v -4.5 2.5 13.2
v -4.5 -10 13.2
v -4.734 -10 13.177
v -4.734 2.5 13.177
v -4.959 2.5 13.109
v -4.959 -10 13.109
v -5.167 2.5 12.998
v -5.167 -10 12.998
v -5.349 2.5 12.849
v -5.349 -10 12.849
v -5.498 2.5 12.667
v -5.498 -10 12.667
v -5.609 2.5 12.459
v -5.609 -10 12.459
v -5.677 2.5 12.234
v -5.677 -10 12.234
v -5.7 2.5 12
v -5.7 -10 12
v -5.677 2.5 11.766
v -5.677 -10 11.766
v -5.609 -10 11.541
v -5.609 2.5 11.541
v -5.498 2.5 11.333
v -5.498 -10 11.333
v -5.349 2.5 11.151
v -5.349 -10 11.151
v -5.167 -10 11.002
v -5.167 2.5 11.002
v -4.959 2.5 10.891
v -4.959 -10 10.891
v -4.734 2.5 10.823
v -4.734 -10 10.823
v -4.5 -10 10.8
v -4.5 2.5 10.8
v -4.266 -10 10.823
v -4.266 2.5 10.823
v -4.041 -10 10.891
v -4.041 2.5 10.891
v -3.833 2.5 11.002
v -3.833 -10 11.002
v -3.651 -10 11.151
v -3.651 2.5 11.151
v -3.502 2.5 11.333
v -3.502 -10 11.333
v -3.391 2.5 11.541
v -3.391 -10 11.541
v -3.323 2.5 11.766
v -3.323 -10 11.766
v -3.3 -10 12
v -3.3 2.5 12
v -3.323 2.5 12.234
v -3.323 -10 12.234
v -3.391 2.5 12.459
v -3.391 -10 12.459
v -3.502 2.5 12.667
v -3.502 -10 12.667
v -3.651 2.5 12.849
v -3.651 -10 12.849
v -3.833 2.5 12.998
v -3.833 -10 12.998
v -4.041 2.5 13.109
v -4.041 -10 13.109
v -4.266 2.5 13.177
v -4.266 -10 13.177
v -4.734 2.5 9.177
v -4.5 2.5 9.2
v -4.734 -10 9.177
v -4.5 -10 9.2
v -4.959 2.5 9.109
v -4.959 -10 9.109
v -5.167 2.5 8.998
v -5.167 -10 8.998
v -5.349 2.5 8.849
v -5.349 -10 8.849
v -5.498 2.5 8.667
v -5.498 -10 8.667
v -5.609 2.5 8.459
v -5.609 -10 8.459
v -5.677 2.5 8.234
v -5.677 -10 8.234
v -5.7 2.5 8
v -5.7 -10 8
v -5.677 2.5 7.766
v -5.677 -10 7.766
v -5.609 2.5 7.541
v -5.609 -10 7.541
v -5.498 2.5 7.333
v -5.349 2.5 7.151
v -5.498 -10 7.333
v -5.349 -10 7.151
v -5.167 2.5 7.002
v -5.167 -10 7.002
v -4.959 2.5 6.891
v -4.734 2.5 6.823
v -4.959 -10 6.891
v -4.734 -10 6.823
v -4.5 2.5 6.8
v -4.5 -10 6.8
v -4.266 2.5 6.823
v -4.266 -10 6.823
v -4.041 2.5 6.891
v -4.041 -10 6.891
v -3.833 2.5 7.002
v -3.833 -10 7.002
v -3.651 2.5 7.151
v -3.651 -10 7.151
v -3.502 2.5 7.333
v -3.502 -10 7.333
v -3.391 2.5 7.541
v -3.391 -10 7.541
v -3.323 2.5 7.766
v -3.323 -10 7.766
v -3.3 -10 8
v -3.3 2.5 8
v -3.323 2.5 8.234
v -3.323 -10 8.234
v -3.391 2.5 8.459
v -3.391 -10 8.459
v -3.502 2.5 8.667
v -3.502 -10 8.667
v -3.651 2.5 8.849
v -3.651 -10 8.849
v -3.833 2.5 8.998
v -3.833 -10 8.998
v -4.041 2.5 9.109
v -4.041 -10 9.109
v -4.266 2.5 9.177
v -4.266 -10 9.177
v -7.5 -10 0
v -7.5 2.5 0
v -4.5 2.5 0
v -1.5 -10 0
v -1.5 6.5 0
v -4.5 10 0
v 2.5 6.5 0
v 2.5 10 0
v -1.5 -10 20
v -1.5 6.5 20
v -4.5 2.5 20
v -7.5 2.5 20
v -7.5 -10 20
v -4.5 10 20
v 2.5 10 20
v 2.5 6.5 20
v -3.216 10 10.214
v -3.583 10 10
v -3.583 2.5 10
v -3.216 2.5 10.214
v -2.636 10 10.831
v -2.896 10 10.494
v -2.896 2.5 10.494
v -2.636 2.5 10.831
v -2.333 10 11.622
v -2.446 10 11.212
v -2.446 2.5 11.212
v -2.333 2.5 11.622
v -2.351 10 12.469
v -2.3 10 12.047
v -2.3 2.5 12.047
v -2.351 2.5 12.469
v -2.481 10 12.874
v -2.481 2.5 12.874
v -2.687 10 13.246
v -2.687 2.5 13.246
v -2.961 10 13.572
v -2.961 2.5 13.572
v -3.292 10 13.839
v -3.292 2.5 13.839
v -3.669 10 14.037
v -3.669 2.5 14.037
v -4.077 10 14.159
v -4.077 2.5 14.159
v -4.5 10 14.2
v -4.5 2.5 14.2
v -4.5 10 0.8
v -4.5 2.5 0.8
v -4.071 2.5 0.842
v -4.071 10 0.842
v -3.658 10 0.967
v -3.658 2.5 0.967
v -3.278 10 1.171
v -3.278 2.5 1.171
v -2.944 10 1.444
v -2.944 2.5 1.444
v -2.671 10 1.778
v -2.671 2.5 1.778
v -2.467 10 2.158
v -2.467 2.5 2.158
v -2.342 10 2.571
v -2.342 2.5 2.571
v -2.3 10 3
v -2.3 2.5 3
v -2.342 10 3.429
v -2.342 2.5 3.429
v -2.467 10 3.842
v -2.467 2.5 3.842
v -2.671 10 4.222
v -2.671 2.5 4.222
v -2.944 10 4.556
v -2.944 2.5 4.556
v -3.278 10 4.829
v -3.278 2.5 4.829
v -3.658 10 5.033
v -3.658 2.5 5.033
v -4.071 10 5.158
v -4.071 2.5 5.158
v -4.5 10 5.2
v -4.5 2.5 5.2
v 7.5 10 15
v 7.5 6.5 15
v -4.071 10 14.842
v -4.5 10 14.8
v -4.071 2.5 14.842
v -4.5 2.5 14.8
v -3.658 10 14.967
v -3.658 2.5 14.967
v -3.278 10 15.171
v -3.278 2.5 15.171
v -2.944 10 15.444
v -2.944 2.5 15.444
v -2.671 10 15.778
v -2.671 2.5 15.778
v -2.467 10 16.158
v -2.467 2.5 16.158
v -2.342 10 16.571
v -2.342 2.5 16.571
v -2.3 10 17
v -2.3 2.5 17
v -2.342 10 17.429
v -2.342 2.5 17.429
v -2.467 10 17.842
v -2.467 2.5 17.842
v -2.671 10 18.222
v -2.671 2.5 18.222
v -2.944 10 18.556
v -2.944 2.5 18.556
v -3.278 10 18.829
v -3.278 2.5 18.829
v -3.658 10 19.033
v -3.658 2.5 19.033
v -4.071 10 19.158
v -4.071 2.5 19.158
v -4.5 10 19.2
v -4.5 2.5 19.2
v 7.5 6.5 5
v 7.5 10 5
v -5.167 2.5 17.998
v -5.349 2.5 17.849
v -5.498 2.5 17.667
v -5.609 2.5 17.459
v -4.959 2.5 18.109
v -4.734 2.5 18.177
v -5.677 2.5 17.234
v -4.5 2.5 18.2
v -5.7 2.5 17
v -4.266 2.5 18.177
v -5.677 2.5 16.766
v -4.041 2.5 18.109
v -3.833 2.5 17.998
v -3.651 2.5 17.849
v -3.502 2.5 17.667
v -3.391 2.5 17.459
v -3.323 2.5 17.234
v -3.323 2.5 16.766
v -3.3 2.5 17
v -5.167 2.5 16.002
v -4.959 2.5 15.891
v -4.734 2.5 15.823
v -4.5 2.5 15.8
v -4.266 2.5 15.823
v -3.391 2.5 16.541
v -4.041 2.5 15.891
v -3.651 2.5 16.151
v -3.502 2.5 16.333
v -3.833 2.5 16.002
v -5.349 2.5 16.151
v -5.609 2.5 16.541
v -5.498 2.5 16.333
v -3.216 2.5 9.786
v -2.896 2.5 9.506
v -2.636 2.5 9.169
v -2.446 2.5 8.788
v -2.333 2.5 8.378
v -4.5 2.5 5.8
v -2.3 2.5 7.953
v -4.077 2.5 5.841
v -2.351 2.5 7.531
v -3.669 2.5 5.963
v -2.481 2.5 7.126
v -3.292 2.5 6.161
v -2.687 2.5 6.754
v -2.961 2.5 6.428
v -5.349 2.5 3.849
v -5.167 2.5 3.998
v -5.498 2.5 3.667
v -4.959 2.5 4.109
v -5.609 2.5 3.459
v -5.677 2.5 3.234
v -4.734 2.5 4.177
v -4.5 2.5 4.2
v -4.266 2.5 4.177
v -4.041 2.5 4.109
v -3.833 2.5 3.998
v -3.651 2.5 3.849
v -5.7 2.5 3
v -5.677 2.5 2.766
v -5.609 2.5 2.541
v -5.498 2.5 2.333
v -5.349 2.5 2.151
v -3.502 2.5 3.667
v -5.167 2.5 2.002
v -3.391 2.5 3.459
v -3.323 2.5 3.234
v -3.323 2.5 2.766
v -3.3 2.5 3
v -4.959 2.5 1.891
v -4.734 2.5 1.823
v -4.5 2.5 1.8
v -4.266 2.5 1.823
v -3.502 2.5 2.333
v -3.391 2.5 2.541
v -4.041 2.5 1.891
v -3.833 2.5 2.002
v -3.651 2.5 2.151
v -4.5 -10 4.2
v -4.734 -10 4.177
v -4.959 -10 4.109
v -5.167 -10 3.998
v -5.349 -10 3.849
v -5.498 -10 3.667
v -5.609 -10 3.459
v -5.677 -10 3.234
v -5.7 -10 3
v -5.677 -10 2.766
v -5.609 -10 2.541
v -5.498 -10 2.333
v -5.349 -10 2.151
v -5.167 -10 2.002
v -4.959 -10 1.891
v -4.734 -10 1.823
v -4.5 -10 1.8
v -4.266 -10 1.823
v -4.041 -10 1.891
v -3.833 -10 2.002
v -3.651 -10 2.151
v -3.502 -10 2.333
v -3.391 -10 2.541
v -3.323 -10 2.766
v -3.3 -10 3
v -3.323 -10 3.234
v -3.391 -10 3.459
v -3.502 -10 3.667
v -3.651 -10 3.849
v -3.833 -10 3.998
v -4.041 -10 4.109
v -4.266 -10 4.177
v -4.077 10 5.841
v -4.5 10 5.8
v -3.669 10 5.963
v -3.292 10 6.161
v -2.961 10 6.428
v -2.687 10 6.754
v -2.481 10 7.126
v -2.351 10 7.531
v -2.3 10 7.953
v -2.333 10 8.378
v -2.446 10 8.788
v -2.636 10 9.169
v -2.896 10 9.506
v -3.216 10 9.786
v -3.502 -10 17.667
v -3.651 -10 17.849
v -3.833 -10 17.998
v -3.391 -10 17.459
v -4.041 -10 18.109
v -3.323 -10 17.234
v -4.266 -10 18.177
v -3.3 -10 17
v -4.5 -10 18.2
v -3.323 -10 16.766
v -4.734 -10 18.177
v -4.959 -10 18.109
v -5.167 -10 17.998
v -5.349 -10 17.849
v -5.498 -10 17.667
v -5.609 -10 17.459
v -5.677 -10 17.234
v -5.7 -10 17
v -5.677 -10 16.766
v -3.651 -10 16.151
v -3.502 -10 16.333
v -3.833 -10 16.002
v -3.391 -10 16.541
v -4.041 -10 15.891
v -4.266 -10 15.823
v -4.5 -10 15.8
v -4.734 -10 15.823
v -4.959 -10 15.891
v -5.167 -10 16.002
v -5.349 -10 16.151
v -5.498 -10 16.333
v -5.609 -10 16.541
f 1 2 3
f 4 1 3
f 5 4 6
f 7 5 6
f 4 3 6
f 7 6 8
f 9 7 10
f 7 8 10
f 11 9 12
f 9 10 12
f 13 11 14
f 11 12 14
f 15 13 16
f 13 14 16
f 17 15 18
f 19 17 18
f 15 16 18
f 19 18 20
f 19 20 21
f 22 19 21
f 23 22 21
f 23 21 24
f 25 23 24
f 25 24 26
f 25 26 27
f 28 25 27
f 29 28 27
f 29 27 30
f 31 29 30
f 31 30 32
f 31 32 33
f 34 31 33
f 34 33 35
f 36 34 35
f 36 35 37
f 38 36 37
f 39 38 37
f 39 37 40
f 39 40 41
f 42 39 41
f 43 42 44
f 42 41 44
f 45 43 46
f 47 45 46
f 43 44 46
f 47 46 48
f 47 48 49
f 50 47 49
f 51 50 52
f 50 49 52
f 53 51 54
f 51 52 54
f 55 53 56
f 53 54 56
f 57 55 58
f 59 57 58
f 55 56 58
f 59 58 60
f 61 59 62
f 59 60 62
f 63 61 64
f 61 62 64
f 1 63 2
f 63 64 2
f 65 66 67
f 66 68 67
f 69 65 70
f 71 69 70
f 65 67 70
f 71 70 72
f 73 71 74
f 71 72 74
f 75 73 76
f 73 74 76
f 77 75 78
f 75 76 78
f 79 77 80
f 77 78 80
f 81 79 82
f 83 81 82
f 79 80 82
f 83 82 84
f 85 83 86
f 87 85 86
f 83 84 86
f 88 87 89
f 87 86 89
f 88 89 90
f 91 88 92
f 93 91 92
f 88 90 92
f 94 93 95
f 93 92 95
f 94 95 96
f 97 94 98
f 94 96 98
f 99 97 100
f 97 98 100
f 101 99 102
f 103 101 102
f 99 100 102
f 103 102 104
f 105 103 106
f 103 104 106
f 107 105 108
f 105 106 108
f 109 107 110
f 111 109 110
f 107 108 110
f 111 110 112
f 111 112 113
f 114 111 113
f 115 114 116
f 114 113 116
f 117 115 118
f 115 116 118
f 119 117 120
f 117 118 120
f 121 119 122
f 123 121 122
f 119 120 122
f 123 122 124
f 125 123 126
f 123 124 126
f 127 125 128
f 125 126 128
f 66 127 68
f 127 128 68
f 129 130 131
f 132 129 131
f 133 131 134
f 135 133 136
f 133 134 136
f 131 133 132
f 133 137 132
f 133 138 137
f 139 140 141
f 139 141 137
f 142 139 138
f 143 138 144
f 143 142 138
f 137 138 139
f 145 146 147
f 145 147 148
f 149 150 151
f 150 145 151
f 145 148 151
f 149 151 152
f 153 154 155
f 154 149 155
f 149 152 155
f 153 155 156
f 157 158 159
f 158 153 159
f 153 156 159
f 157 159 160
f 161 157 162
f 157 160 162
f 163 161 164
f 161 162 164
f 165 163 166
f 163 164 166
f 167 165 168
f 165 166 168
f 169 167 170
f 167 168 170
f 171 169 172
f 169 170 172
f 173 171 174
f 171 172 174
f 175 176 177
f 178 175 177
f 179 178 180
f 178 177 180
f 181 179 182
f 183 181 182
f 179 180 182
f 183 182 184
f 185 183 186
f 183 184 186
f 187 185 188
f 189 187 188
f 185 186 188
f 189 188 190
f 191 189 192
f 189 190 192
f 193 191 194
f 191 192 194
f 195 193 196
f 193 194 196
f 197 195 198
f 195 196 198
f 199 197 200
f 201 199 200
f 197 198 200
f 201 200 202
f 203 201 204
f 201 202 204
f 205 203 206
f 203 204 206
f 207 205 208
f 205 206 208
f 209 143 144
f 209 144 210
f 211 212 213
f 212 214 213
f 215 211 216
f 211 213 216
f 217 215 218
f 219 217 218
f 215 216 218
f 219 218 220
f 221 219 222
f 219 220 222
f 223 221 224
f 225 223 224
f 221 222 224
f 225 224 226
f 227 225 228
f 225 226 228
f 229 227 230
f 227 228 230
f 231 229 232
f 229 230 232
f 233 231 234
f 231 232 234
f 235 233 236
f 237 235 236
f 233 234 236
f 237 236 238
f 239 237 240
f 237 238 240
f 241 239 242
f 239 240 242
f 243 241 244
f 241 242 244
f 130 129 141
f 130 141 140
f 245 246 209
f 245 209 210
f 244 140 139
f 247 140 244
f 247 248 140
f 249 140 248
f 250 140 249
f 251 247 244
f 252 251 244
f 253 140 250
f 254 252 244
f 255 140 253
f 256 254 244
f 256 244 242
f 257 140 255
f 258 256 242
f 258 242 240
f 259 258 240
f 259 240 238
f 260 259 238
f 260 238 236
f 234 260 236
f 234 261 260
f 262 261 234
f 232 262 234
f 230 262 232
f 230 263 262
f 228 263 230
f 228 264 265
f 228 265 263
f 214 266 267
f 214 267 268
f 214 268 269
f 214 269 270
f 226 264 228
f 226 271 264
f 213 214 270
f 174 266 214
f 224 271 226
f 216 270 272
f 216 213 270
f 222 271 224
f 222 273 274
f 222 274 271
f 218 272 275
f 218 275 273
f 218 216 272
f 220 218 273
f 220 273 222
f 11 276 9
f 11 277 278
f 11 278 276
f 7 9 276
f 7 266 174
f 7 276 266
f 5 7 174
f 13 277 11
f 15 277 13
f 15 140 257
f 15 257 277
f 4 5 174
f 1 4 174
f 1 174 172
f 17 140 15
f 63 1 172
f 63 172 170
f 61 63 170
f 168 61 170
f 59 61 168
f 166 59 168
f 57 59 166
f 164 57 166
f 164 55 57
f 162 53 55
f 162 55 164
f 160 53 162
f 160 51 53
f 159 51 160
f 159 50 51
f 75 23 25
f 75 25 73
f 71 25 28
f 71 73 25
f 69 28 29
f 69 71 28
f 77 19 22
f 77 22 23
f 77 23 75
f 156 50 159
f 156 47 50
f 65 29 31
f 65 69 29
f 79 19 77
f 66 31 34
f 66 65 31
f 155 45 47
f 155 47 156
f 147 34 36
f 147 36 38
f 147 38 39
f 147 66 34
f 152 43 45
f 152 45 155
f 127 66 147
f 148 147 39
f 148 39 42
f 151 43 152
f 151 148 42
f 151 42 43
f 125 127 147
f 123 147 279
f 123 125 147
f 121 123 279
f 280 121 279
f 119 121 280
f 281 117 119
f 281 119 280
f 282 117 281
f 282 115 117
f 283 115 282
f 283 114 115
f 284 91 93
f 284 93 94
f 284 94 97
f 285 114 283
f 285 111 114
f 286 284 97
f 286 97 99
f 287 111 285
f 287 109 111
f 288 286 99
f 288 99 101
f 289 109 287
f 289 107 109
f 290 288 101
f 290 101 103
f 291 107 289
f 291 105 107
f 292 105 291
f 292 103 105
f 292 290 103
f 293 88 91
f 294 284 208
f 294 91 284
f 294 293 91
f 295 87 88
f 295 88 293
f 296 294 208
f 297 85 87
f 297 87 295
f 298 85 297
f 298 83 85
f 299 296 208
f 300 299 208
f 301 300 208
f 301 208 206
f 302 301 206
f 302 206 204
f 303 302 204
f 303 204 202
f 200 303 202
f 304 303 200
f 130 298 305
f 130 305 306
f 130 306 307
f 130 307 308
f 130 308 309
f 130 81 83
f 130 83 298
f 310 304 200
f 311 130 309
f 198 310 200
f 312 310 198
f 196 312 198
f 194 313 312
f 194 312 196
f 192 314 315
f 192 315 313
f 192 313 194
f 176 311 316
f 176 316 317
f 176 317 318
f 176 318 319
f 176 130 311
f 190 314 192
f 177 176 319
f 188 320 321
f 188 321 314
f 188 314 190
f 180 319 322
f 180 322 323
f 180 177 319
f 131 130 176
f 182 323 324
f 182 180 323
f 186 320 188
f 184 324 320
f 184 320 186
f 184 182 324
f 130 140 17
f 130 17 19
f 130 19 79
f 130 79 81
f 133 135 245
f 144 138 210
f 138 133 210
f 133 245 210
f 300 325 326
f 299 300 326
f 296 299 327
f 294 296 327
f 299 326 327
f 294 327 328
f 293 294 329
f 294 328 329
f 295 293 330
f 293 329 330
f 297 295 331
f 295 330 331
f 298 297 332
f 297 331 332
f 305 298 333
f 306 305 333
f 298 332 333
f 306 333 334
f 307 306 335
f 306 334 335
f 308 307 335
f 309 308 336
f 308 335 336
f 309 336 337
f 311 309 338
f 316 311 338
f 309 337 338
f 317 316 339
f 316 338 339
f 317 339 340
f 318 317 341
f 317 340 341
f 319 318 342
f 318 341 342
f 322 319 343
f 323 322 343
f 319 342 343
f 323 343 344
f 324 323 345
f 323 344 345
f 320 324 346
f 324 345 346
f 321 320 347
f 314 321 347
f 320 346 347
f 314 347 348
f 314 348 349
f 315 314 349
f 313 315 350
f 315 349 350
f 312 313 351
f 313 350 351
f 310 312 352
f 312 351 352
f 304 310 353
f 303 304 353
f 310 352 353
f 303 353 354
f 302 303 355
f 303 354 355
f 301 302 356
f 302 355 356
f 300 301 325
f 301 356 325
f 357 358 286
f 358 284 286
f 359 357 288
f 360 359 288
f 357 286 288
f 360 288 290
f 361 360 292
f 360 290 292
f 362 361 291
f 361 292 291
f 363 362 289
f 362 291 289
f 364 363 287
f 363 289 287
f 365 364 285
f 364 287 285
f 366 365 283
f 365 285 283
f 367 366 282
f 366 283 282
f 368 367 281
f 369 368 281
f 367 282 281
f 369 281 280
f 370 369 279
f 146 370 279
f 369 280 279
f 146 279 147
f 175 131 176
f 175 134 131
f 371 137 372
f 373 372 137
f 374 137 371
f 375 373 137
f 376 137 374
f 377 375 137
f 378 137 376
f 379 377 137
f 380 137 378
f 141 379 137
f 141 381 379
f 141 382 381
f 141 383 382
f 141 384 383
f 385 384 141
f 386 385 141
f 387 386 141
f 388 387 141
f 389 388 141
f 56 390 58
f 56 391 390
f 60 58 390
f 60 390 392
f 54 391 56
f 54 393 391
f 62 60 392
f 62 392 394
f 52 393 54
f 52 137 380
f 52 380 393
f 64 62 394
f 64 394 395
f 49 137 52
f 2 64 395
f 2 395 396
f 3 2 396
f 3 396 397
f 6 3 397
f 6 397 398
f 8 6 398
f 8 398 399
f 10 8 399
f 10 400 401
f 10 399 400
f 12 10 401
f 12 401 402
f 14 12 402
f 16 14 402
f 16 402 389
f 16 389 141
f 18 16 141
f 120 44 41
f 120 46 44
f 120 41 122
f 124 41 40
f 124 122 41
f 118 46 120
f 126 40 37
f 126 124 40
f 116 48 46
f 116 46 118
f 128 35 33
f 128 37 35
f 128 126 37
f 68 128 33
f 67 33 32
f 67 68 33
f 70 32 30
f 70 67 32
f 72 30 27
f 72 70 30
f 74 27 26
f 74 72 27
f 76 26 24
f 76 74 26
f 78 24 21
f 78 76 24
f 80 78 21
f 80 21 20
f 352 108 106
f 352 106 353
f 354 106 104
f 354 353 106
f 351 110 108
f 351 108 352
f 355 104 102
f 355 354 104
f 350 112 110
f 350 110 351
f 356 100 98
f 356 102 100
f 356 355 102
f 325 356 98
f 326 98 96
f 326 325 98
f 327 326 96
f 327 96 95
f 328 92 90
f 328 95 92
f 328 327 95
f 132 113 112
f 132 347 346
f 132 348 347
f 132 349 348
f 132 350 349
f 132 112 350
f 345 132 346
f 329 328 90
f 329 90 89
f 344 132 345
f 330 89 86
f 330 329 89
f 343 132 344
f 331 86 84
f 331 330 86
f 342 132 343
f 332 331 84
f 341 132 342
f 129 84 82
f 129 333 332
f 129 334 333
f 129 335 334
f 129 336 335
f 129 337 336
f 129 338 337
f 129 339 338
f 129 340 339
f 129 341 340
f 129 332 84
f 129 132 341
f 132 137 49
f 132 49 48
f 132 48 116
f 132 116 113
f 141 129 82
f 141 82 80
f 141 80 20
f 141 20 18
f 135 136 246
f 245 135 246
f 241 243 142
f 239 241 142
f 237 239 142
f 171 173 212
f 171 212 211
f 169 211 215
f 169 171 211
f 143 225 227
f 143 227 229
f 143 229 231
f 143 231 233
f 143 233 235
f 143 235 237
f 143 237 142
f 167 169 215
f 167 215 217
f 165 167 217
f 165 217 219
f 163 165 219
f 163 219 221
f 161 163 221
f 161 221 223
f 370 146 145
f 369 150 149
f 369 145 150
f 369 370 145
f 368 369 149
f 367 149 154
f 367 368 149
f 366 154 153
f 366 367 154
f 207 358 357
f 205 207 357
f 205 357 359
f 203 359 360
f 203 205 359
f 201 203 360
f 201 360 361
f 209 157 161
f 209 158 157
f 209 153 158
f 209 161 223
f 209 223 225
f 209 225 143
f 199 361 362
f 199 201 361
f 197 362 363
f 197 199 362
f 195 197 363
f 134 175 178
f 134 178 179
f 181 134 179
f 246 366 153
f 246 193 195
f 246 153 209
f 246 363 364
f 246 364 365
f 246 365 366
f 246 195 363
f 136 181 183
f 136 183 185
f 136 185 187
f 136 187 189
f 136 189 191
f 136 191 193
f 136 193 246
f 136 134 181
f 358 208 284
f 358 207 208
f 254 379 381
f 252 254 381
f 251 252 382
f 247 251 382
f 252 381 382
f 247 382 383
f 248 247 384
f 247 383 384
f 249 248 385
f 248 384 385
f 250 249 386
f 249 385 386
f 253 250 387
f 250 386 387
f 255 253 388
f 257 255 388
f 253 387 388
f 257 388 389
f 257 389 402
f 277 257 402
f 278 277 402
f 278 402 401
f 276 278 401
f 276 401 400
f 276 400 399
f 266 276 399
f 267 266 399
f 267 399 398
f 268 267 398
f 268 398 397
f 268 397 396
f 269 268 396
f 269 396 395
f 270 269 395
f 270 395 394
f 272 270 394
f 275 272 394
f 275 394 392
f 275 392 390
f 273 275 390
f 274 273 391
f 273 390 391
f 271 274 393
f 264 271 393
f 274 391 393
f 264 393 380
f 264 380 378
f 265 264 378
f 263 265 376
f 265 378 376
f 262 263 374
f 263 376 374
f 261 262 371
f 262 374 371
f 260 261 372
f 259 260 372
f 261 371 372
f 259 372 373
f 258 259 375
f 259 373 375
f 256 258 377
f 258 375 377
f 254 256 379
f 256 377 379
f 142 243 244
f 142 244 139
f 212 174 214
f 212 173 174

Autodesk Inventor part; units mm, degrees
ref_plane "YZ Plane" through (0, 0, 0) normal (1, 0, 0) x (0, 1, 0)
ref_plane "XZ Plane" through (0, 0, 0) normal (0, 1, 0) x (-1, 0, 0)
ref_plane "XY Plane" through (0, 0, 0) normal (0, 0, 1) x (1, 0, 0)
sketch "Sketch1" plane through (0, 0, 0) normal (0, 0, 1) x (1, 0, 0)
  line L0 (-7.5, 10) -> (7.5, 10)
  line L1 (7.5, 10) -> (7.5, -10)
  line L2 (7.5, -10) -> (-7.5, -10)
  line L3 (-7.5, -10) -> (-7.5, 10)
  point P0 (0, 0)
  dimension "d0" = 15
  dimension "d1" = 20
  dimension "d2" = 7.5
  dimension "d3" = 10
extrude "Extrusion1" add sketch "Sketch1" along normal blind 20
sketch "Sketch2" plane through (7.5, -10, 0) normal (1, 0, 0) x (0, 0, -1)
  line L0 (0, 20) -> (0, 0) projected
  line L1 (0, 20) -> (-20, 20) projected
  line L2 (-20, 0) -> (-20, 20) projected
  line L3 (0, 0) -> (-20, 0) projected
  line L4 (-20, 0) -> (0, 0)
  line L5 (0, 0) -> (0, 16.5)
  line L6 (0, 16.5) -> (-20, 16.5)
  line L7 (-20, 16.5) -> (-20, 0)
  point P0 (0, 10)
  dimension "d6" = 16.5
extrude "Extrusion2" cut sketch "Sketch2" against normal blind 9 contours L0 L3 L2 L6
sketch "Sketch3" plane through (-7.5, 10, 0) normal (0, 1, 0) x (1, 0, 0)
  circle A0 centre (3, -12) radius 0.7835
  circle A1 centre (3, -17) radius 0.7835
  line L0 (0, 0) -> (15, 0) projected
  line L1 (0, 0) -> (0, -20) projected
  line L2 (15, -20) -> (0, -20) projected
  line L3 (15, 0) -> (15, -20) projected
  circle A2 centre (3, -8) radius 0.7835
  circle A3 centre (3, -3) radius 0.7835
  point P0 (7.5, 0)
  dimension "d22" = 3
  dimension "d23" = 3
  dimension "d24" = 3
  dimension "d25" = 8
  dimension "d26" = 3
  dimension "d27" = 8
  dimension "d28" = 3
  dimension "d29" = 3
hole "Hole1" at (-4.5, 10, 12) at (-4.5, 10, 17) at (-4.5, 10, 8) at (-4.5, 10, 3) direction (0, -1, 0) diameter 2.4 end through all counterbore diameter 4.4 counterbore depth 7.5 clearance for "Socket Head Cap Screw" size "M2" standard "Ansi Metric M Profile"
sketch "Sketch4" plane through (-7.5, 10, 0) normal (0, 1, 0) x (1, 0, 0)
  arc A0 (2.0835, -10) -> (3.9165, -10) centre (3, -12) ccw projected
  circle A1 centre (3, -17) radius 2.2 projected
  line L0 (0, 0) -> (15, 0) projected
  line L1 (0, 0) -> (0, -20) projected
  line L2 (15, -20) -> (0, -20) projected
  line L3 (15, 0) -> (15, -20) projected
  line L4 (15, 0) -> (10, 0)
  line L5 (10, 0) -> (15, -5)
  line L6 (15, 0) -> (15, -5)
  line L7 (15, -20) -> (15, -15)
  line L8 (15, -20) -> (10, -20)
  line L9 (10, -20) -> (15, -15)
  arc A2 (3.9165, -10) -> (2.0835, -10) centre (3, -8) ccw projected
  point P0 (7.5, 0)
  dimension "d16" = 5
  dimension "d17" = 5
  dimension "d18" = 5
  dimension "d19" = 5
extrude "Extrusion3" cut sketch "Sketch4" against normal through all contours L0 L3 L5 | L9 L3 L2
sketch "Sketch5" plane through (-7.5, 10, 20) normal (0, 1, 0) x (1, 0, 0)
  line L0 (15, 15) -> (10, 20) projected
  line L1 (0, 20) -> (10, 20) projected
  line L2 (0, 20) -> (0, 0) projected
  line L3 (10, 0) -> (0, 0) projected
  line L4 (10, 0) -> (15, 5) projected
  line L5 (15, 15) -> (15, 5) projected
  circle A0 centre (3, 17) radius 2.2 projected
  circle A1 centre (3, 3) radius 2.2 projected
  arc A2 (3.9165, 10) -> (2.0835, 10) centre (3, 12) ccw projected
  arc A3 (2.0835, 10) -> (3.9165, 10) centre (3, 8) ccw projected
  line L6 (0, 20) -> (3, 20)
  line L7 (3, 20) -> (3, 0)
  line L8 (3, 0) -> (0, 0)
  line L9 (0, 0) -> (0, 20)
  point P0 (7.5, 20)
  dimension "d30" = 3
extrude "Extrusion4" cut sketch "Sketch5" against normal blind 7.5 contours L7 A0 A2 A3 A1 L3 L2 L1 | L7 A0 | A1 L7 | L7 A3 A2 picked at (2.1729, 17.6329) picked at (2.3382, 2.4724) picked at (2.6945, 10)
equation "\"d2\" = 0.5 * d0"
equation "\"d3\" = 0.5 * d1"
properties part number "galvo_stop"
